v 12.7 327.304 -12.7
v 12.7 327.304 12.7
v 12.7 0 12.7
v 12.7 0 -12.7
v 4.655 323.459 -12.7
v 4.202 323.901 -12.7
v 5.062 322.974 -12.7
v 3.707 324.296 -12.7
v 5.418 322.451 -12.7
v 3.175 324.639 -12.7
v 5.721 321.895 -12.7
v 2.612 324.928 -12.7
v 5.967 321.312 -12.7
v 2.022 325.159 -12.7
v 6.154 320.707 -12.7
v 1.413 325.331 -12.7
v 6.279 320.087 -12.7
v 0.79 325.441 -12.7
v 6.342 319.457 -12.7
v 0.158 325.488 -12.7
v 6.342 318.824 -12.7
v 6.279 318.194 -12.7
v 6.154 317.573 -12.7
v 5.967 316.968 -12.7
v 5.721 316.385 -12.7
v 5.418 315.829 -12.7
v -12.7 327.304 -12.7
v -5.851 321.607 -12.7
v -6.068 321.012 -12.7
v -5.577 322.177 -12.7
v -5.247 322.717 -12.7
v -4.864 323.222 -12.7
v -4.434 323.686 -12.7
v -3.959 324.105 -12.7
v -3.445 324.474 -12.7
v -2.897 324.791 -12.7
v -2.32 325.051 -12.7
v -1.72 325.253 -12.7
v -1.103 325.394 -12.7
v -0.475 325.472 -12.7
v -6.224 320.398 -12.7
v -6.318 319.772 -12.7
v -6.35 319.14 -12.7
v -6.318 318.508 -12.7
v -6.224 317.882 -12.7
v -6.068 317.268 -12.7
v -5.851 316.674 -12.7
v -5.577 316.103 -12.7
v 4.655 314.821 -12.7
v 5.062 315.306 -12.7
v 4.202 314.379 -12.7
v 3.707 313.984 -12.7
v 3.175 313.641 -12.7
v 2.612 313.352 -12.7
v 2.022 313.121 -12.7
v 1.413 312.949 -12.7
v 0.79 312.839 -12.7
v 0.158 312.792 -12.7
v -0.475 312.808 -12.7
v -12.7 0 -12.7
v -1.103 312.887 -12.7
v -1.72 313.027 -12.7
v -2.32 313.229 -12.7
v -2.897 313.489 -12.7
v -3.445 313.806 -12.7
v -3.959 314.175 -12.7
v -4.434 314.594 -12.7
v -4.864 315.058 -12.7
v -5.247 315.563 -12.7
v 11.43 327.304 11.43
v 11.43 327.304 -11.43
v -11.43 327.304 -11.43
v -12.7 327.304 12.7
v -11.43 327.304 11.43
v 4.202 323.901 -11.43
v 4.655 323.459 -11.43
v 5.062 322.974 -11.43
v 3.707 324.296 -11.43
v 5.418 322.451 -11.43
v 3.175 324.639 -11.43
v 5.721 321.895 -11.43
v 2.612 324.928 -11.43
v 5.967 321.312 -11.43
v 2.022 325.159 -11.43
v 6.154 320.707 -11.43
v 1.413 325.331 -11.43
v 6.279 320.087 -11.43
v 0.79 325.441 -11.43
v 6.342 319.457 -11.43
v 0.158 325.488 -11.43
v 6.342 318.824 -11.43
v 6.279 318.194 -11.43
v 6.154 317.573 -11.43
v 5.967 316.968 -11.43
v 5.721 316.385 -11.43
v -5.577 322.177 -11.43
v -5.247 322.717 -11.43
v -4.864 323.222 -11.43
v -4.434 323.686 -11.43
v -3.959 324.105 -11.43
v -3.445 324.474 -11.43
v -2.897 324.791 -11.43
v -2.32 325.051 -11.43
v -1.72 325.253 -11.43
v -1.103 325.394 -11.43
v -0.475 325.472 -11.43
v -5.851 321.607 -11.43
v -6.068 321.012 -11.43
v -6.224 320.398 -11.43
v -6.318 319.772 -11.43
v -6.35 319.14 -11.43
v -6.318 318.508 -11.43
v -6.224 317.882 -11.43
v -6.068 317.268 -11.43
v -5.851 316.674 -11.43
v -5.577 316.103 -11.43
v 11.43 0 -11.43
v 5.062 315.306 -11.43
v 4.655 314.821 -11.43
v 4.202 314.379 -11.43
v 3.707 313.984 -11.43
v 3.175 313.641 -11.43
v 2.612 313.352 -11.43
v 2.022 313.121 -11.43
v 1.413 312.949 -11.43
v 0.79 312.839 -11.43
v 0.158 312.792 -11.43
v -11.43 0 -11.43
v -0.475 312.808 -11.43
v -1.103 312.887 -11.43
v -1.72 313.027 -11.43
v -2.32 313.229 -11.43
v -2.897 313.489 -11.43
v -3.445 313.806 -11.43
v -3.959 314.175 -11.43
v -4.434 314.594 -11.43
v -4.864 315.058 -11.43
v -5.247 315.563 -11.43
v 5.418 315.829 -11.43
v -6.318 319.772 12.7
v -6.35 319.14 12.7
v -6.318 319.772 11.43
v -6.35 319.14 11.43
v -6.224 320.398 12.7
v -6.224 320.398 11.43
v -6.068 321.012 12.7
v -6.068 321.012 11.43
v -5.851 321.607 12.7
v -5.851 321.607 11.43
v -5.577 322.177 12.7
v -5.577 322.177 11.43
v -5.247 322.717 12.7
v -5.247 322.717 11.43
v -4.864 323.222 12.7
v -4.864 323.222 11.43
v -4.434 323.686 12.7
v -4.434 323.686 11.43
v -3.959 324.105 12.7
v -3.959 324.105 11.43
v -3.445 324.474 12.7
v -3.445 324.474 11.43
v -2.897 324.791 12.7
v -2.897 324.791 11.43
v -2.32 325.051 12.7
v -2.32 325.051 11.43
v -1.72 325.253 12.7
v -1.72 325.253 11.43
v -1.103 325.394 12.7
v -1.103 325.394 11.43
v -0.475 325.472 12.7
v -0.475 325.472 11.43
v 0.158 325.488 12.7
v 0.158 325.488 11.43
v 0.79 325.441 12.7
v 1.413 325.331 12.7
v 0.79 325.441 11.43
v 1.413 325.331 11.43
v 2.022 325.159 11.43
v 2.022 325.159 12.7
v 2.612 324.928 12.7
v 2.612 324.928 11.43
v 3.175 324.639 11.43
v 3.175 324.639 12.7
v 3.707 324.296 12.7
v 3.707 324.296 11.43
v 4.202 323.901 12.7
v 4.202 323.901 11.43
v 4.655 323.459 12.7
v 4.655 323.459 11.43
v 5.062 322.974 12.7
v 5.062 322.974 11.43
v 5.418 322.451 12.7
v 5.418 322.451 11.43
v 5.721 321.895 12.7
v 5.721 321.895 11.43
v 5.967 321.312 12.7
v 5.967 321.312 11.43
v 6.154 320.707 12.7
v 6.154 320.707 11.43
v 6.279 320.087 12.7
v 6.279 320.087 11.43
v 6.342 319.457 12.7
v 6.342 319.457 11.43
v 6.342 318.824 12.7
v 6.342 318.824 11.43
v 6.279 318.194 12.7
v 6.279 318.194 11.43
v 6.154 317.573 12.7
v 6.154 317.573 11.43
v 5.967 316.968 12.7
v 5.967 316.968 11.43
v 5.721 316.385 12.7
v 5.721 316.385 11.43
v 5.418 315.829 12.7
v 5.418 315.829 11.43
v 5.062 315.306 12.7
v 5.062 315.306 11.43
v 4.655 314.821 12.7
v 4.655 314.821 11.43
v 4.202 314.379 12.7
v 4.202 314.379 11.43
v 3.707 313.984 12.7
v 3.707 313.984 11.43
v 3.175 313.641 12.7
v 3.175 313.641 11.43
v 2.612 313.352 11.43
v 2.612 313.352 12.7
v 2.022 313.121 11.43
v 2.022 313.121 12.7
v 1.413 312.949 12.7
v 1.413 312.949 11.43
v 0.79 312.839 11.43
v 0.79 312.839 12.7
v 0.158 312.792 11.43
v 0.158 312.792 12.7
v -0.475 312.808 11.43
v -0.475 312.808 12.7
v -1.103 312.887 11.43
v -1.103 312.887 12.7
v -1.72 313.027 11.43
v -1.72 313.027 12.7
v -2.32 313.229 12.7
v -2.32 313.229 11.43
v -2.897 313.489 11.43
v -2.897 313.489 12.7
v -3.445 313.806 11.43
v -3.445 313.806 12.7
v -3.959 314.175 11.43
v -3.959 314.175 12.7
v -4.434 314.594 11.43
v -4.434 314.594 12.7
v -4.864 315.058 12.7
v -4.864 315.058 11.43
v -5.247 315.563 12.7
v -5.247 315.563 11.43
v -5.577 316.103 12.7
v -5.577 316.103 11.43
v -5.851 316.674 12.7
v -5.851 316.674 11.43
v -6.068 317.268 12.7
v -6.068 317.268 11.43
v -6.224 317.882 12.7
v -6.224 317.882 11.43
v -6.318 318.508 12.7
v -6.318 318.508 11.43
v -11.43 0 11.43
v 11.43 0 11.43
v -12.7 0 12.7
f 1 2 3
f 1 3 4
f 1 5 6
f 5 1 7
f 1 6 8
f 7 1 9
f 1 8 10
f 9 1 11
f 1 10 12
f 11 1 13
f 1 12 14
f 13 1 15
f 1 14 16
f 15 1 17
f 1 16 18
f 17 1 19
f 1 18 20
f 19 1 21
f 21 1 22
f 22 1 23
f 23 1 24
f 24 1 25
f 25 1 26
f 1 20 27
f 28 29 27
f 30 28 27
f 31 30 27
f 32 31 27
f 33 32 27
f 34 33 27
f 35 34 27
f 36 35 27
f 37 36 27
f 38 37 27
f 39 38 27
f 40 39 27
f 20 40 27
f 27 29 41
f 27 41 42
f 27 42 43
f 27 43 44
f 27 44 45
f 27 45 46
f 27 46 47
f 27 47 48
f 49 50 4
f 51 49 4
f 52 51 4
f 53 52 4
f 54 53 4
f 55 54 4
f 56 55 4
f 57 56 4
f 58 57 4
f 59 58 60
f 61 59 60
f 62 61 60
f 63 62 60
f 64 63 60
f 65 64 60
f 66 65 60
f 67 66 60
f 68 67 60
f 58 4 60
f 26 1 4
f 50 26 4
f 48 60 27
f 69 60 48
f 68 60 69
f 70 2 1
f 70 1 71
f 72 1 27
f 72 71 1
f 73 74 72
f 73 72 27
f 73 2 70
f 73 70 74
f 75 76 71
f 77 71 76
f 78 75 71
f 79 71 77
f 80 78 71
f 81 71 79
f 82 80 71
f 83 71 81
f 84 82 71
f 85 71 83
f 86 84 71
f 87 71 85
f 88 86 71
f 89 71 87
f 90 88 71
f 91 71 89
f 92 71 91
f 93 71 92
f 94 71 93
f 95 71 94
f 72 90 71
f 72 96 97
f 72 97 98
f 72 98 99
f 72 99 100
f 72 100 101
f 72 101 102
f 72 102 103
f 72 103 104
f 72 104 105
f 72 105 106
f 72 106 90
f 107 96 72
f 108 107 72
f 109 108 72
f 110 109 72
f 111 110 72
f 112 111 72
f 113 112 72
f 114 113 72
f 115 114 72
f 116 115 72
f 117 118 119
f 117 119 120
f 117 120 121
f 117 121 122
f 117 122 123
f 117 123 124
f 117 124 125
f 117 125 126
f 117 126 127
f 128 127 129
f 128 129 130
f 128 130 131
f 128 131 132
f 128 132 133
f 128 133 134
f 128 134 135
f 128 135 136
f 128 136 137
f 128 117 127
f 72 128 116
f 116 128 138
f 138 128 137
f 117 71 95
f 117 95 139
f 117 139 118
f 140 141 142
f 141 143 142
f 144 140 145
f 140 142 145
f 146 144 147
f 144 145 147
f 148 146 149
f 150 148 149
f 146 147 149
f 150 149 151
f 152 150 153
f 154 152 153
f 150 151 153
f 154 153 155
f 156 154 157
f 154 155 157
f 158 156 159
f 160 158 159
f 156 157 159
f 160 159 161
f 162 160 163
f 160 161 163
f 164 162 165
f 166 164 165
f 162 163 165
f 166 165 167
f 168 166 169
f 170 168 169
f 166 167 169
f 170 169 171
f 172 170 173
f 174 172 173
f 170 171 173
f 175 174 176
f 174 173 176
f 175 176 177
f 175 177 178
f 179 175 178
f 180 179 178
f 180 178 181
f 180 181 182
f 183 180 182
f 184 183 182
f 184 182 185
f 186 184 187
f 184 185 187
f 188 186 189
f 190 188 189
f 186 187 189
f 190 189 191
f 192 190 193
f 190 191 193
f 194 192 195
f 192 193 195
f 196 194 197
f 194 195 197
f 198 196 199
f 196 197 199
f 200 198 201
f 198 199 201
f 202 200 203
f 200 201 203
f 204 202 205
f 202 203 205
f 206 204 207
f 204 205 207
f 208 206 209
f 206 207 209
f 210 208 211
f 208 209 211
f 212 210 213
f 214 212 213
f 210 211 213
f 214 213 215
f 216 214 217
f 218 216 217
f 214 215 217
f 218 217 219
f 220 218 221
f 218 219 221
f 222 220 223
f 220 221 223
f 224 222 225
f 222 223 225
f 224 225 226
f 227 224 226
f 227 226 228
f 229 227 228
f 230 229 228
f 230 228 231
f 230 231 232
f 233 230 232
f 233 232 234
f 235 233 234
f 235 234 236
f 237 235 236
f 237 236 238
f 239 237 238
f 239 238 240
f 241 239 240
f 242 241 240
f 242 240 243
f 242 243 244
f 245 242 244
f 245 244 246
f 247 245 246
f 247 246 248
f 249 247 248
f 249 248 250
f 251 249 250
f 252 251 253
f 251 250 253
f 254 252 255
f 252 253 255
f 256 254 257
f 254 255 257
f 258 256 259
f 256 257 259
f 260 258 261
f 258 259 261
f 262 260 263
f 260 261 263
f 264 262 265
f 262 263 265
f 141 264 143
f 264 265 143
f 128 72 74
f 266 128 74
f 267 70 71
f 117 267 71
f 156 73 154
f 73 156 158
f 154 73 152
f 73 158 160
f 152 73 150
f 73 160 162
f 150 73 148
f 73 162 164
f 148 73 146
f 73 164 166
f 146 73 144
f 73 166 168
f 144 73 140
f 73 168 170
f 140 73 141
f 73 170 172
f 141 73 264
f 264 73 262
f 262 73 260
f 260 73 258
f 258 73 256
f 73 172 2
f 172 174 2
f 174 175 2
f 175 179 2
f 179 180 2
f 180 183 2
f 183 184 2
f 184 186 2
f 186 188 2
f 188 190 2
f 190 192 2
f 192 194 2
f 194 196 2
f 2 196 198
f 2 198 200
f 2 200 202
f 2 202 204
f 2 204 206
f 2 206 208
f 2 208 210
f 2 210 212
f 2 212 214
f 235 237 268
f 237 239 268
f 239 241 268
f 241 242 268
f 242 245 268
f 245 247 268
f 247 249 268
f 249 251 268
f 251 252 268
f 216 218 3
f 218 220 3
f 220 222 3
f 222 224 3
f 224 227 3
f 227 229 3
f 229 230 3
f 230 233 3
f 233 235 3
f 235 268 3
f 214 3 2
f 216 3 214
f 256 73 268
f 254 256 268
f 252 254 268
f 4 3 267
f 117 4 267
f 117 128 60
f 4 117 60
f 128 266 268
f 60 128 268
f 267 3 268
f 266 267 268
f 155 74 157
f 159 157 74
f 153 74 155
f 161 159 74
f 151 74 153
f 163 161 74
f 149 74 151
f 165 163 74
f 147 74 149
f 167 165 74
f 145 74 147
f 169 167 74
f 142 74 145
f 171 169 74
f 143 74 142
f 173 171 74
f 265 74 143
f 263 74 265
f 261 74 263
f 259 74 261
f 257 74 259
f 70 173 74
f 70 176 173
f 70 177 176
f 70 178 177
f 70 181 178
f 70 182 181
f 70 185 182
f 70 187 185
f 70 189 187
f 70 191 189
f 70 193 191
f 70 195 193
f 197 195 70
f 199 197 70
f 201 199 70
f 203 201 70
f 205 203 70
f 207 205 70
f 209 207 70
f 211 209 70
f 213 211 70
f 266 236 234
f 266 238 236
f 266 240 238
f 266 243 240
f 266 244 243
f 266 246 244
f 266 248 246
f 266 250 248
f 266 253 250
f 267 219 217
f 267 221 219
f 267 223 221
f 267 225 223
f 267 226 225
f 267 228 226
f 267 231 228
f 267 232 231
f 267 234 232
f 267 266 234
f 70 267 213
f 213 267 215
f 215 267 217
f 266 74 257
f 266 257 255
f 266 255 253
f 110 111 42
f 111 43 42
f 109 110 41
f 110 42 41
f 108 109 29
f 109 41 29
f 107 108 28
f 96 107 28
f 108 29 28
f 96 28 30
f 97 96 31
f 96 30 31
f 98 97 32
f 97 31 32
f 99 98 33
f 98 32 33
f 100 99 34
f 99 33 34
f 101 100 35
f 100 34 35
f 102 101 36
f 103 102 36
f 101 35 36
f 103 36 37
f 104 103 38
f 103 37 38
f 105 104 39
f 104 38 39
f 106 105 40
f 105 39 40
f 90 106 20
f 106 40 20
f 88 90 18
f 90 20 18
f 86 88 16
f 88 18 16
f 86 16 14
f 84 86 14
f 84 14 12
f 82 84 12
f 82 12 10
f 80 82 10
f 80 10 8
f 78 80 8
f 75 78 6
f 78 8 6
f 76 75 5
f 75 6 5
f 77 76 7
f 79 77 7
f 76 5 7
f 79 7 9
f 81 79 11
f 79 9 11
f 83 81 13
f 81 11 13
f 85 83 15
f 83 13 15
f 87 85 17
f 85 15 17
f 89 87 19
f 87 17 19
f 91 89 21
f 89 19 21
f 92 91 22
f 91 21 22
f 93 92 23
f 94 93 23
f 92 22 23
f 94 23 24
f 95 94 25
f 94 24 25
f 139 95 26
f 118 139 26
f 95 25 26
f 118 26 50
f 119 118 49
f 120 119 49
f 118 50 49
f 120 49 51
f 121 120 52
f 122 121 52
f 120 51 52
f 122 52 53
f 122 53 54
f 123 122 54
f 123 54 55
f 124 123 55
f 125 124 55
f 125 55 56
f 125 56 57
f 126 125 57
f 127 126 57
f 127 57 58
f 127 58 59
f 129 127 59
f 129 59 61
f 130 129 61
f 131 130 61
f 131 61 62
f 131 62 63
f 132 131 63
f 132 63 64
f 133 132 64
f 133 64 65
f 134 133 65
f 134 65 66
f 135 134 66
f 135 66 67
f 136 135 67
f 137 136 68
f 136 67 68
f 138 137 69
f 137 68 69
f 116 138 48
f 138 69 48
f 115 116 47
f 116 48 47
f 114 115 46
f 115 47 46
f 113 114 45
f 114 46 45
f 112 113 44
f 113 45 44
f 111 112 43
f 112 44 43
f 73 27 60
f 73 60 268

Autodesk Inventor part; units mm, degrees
ref_plane "YZ Plane" through (0, 0, 0) normal (1, 0, 0) x (0, 1, 0)
ref_plane "XZ Plane" through (0, 0, 0) normal (0, 1, 0) x (-1, 0, 0)
ref_plane "XY Plane" through (0, 0, 0) normal (0, 0, 1) x (1, 0, 0)
sketch "Sketch1" plane through (0, 0, 0) normal (0, 1, 0) x (-1, 0, 0)
  line L0 (-12.7, -12.7) -> (12.7, -12.7)
  line L1 (12.7, -12.7) -> (12.7, 12.7)
  line L2 (12.7, 12.7) -> (-12.7, 12.7)
  line L3 (-12.7, 12.7) -> (-12.7, -12.7)
  line L4 (-12.7, -12.7) -> (12.7, 12.7) construction
  line L5 (12.7, -12.7) -> (-12.7, 12.7) construction
  line L6 (-11.43, -11.43) -> (11.43, -11.43)
  line L7 (11.43, -11.43) -> (11.43, 11.43)
  line L8 (11.43, 11.43) -> (-11.43, 11.43)
  line L9 (-11.43, 11.43) -> (-11.43, -11.43)
  line L10 (-11.43, -11.43) -> (11.43, 11.43) construction
  line L11 (11.43, -11.43) -> (-11.43, 11.43) construction
  point P0 (0, 0)
  dimension "d0" = 25.4
  dimension "d1" = 25.4
  dimension "d2" = 22.86
  dimension "d3" = 22.86
extrude "Extrusion1" add sketch "Sketch1" along normal blind 327.3044
sketch "Sketch2" plane through (0, 327.3044, 0) normal (0, 1, 0) x (1, 0, 0)
  line L0 (11.43, 11.43) -> (11.43, -11.43) projected
  line L1 (11.43, -11.43) -> (-11.43, -11.43) projected
  line L2 (-11.43, -11.43) -> (-11.43, 11.43) projected
  line L3 (-11.43, 11.43) -> (11.43, 11.43) projected
  line L4 (12.7, 12.7) -> (-12.7, 12.7) projected
  line L5 (-12.7, 12.7) -> (-12.7, -12.7) projected
  line L6 (-12.7, -12.7) -> (12.7, -12.7) projected
  line L7 (12.7, -12.7) -> (12.7, 12.7) projected
  point P0 (0, 0)
extrude "Extrusion2" add sketch "Sketch2" against normal blind 327.3044
sketch "Sketch5" plane through (12.7, 0, -12.7) normal (0, 0, -1) x (-1, 0, 0)
  circle A0 centre (12.7, 319.1401) radius 6.35
  line L0 (106.09, 453.881) -> (-174.2251, -6.5402) construction
  line L1 (78.7715, 457.8537) -> (-195.9205, 6.6684) construction
  line L2 (-0.7099, 327.3044) -> (20.9855, 314.0957) construction
  point P0 (12.7, 0)
  dimension "d12" = 12.7
extrude "Extrusion4" cut sketch "Sketch5" against normal blind 59.9694
equation "\"BendRadius\" = Thickness"
equation "\"BendReliefWidth\" = Thickness"
equation "\"BendReliefDepth\" = 0.5 * Thickness"
equation "\"CornerReliefSize\" = 4 * Thickness"
equation "\"MinimumRemnant\" = 2 * Thickness"
equation "\"TransitionRadius\" = BendRadius"
equation "\"JacobiRadiusSize\" = BendRadius"
equation "\"GapSize\" = Thickness"
equation "\"Thickness\" = 3.048"
properties part number "Convery frame2" material "Aluminum 6061"
